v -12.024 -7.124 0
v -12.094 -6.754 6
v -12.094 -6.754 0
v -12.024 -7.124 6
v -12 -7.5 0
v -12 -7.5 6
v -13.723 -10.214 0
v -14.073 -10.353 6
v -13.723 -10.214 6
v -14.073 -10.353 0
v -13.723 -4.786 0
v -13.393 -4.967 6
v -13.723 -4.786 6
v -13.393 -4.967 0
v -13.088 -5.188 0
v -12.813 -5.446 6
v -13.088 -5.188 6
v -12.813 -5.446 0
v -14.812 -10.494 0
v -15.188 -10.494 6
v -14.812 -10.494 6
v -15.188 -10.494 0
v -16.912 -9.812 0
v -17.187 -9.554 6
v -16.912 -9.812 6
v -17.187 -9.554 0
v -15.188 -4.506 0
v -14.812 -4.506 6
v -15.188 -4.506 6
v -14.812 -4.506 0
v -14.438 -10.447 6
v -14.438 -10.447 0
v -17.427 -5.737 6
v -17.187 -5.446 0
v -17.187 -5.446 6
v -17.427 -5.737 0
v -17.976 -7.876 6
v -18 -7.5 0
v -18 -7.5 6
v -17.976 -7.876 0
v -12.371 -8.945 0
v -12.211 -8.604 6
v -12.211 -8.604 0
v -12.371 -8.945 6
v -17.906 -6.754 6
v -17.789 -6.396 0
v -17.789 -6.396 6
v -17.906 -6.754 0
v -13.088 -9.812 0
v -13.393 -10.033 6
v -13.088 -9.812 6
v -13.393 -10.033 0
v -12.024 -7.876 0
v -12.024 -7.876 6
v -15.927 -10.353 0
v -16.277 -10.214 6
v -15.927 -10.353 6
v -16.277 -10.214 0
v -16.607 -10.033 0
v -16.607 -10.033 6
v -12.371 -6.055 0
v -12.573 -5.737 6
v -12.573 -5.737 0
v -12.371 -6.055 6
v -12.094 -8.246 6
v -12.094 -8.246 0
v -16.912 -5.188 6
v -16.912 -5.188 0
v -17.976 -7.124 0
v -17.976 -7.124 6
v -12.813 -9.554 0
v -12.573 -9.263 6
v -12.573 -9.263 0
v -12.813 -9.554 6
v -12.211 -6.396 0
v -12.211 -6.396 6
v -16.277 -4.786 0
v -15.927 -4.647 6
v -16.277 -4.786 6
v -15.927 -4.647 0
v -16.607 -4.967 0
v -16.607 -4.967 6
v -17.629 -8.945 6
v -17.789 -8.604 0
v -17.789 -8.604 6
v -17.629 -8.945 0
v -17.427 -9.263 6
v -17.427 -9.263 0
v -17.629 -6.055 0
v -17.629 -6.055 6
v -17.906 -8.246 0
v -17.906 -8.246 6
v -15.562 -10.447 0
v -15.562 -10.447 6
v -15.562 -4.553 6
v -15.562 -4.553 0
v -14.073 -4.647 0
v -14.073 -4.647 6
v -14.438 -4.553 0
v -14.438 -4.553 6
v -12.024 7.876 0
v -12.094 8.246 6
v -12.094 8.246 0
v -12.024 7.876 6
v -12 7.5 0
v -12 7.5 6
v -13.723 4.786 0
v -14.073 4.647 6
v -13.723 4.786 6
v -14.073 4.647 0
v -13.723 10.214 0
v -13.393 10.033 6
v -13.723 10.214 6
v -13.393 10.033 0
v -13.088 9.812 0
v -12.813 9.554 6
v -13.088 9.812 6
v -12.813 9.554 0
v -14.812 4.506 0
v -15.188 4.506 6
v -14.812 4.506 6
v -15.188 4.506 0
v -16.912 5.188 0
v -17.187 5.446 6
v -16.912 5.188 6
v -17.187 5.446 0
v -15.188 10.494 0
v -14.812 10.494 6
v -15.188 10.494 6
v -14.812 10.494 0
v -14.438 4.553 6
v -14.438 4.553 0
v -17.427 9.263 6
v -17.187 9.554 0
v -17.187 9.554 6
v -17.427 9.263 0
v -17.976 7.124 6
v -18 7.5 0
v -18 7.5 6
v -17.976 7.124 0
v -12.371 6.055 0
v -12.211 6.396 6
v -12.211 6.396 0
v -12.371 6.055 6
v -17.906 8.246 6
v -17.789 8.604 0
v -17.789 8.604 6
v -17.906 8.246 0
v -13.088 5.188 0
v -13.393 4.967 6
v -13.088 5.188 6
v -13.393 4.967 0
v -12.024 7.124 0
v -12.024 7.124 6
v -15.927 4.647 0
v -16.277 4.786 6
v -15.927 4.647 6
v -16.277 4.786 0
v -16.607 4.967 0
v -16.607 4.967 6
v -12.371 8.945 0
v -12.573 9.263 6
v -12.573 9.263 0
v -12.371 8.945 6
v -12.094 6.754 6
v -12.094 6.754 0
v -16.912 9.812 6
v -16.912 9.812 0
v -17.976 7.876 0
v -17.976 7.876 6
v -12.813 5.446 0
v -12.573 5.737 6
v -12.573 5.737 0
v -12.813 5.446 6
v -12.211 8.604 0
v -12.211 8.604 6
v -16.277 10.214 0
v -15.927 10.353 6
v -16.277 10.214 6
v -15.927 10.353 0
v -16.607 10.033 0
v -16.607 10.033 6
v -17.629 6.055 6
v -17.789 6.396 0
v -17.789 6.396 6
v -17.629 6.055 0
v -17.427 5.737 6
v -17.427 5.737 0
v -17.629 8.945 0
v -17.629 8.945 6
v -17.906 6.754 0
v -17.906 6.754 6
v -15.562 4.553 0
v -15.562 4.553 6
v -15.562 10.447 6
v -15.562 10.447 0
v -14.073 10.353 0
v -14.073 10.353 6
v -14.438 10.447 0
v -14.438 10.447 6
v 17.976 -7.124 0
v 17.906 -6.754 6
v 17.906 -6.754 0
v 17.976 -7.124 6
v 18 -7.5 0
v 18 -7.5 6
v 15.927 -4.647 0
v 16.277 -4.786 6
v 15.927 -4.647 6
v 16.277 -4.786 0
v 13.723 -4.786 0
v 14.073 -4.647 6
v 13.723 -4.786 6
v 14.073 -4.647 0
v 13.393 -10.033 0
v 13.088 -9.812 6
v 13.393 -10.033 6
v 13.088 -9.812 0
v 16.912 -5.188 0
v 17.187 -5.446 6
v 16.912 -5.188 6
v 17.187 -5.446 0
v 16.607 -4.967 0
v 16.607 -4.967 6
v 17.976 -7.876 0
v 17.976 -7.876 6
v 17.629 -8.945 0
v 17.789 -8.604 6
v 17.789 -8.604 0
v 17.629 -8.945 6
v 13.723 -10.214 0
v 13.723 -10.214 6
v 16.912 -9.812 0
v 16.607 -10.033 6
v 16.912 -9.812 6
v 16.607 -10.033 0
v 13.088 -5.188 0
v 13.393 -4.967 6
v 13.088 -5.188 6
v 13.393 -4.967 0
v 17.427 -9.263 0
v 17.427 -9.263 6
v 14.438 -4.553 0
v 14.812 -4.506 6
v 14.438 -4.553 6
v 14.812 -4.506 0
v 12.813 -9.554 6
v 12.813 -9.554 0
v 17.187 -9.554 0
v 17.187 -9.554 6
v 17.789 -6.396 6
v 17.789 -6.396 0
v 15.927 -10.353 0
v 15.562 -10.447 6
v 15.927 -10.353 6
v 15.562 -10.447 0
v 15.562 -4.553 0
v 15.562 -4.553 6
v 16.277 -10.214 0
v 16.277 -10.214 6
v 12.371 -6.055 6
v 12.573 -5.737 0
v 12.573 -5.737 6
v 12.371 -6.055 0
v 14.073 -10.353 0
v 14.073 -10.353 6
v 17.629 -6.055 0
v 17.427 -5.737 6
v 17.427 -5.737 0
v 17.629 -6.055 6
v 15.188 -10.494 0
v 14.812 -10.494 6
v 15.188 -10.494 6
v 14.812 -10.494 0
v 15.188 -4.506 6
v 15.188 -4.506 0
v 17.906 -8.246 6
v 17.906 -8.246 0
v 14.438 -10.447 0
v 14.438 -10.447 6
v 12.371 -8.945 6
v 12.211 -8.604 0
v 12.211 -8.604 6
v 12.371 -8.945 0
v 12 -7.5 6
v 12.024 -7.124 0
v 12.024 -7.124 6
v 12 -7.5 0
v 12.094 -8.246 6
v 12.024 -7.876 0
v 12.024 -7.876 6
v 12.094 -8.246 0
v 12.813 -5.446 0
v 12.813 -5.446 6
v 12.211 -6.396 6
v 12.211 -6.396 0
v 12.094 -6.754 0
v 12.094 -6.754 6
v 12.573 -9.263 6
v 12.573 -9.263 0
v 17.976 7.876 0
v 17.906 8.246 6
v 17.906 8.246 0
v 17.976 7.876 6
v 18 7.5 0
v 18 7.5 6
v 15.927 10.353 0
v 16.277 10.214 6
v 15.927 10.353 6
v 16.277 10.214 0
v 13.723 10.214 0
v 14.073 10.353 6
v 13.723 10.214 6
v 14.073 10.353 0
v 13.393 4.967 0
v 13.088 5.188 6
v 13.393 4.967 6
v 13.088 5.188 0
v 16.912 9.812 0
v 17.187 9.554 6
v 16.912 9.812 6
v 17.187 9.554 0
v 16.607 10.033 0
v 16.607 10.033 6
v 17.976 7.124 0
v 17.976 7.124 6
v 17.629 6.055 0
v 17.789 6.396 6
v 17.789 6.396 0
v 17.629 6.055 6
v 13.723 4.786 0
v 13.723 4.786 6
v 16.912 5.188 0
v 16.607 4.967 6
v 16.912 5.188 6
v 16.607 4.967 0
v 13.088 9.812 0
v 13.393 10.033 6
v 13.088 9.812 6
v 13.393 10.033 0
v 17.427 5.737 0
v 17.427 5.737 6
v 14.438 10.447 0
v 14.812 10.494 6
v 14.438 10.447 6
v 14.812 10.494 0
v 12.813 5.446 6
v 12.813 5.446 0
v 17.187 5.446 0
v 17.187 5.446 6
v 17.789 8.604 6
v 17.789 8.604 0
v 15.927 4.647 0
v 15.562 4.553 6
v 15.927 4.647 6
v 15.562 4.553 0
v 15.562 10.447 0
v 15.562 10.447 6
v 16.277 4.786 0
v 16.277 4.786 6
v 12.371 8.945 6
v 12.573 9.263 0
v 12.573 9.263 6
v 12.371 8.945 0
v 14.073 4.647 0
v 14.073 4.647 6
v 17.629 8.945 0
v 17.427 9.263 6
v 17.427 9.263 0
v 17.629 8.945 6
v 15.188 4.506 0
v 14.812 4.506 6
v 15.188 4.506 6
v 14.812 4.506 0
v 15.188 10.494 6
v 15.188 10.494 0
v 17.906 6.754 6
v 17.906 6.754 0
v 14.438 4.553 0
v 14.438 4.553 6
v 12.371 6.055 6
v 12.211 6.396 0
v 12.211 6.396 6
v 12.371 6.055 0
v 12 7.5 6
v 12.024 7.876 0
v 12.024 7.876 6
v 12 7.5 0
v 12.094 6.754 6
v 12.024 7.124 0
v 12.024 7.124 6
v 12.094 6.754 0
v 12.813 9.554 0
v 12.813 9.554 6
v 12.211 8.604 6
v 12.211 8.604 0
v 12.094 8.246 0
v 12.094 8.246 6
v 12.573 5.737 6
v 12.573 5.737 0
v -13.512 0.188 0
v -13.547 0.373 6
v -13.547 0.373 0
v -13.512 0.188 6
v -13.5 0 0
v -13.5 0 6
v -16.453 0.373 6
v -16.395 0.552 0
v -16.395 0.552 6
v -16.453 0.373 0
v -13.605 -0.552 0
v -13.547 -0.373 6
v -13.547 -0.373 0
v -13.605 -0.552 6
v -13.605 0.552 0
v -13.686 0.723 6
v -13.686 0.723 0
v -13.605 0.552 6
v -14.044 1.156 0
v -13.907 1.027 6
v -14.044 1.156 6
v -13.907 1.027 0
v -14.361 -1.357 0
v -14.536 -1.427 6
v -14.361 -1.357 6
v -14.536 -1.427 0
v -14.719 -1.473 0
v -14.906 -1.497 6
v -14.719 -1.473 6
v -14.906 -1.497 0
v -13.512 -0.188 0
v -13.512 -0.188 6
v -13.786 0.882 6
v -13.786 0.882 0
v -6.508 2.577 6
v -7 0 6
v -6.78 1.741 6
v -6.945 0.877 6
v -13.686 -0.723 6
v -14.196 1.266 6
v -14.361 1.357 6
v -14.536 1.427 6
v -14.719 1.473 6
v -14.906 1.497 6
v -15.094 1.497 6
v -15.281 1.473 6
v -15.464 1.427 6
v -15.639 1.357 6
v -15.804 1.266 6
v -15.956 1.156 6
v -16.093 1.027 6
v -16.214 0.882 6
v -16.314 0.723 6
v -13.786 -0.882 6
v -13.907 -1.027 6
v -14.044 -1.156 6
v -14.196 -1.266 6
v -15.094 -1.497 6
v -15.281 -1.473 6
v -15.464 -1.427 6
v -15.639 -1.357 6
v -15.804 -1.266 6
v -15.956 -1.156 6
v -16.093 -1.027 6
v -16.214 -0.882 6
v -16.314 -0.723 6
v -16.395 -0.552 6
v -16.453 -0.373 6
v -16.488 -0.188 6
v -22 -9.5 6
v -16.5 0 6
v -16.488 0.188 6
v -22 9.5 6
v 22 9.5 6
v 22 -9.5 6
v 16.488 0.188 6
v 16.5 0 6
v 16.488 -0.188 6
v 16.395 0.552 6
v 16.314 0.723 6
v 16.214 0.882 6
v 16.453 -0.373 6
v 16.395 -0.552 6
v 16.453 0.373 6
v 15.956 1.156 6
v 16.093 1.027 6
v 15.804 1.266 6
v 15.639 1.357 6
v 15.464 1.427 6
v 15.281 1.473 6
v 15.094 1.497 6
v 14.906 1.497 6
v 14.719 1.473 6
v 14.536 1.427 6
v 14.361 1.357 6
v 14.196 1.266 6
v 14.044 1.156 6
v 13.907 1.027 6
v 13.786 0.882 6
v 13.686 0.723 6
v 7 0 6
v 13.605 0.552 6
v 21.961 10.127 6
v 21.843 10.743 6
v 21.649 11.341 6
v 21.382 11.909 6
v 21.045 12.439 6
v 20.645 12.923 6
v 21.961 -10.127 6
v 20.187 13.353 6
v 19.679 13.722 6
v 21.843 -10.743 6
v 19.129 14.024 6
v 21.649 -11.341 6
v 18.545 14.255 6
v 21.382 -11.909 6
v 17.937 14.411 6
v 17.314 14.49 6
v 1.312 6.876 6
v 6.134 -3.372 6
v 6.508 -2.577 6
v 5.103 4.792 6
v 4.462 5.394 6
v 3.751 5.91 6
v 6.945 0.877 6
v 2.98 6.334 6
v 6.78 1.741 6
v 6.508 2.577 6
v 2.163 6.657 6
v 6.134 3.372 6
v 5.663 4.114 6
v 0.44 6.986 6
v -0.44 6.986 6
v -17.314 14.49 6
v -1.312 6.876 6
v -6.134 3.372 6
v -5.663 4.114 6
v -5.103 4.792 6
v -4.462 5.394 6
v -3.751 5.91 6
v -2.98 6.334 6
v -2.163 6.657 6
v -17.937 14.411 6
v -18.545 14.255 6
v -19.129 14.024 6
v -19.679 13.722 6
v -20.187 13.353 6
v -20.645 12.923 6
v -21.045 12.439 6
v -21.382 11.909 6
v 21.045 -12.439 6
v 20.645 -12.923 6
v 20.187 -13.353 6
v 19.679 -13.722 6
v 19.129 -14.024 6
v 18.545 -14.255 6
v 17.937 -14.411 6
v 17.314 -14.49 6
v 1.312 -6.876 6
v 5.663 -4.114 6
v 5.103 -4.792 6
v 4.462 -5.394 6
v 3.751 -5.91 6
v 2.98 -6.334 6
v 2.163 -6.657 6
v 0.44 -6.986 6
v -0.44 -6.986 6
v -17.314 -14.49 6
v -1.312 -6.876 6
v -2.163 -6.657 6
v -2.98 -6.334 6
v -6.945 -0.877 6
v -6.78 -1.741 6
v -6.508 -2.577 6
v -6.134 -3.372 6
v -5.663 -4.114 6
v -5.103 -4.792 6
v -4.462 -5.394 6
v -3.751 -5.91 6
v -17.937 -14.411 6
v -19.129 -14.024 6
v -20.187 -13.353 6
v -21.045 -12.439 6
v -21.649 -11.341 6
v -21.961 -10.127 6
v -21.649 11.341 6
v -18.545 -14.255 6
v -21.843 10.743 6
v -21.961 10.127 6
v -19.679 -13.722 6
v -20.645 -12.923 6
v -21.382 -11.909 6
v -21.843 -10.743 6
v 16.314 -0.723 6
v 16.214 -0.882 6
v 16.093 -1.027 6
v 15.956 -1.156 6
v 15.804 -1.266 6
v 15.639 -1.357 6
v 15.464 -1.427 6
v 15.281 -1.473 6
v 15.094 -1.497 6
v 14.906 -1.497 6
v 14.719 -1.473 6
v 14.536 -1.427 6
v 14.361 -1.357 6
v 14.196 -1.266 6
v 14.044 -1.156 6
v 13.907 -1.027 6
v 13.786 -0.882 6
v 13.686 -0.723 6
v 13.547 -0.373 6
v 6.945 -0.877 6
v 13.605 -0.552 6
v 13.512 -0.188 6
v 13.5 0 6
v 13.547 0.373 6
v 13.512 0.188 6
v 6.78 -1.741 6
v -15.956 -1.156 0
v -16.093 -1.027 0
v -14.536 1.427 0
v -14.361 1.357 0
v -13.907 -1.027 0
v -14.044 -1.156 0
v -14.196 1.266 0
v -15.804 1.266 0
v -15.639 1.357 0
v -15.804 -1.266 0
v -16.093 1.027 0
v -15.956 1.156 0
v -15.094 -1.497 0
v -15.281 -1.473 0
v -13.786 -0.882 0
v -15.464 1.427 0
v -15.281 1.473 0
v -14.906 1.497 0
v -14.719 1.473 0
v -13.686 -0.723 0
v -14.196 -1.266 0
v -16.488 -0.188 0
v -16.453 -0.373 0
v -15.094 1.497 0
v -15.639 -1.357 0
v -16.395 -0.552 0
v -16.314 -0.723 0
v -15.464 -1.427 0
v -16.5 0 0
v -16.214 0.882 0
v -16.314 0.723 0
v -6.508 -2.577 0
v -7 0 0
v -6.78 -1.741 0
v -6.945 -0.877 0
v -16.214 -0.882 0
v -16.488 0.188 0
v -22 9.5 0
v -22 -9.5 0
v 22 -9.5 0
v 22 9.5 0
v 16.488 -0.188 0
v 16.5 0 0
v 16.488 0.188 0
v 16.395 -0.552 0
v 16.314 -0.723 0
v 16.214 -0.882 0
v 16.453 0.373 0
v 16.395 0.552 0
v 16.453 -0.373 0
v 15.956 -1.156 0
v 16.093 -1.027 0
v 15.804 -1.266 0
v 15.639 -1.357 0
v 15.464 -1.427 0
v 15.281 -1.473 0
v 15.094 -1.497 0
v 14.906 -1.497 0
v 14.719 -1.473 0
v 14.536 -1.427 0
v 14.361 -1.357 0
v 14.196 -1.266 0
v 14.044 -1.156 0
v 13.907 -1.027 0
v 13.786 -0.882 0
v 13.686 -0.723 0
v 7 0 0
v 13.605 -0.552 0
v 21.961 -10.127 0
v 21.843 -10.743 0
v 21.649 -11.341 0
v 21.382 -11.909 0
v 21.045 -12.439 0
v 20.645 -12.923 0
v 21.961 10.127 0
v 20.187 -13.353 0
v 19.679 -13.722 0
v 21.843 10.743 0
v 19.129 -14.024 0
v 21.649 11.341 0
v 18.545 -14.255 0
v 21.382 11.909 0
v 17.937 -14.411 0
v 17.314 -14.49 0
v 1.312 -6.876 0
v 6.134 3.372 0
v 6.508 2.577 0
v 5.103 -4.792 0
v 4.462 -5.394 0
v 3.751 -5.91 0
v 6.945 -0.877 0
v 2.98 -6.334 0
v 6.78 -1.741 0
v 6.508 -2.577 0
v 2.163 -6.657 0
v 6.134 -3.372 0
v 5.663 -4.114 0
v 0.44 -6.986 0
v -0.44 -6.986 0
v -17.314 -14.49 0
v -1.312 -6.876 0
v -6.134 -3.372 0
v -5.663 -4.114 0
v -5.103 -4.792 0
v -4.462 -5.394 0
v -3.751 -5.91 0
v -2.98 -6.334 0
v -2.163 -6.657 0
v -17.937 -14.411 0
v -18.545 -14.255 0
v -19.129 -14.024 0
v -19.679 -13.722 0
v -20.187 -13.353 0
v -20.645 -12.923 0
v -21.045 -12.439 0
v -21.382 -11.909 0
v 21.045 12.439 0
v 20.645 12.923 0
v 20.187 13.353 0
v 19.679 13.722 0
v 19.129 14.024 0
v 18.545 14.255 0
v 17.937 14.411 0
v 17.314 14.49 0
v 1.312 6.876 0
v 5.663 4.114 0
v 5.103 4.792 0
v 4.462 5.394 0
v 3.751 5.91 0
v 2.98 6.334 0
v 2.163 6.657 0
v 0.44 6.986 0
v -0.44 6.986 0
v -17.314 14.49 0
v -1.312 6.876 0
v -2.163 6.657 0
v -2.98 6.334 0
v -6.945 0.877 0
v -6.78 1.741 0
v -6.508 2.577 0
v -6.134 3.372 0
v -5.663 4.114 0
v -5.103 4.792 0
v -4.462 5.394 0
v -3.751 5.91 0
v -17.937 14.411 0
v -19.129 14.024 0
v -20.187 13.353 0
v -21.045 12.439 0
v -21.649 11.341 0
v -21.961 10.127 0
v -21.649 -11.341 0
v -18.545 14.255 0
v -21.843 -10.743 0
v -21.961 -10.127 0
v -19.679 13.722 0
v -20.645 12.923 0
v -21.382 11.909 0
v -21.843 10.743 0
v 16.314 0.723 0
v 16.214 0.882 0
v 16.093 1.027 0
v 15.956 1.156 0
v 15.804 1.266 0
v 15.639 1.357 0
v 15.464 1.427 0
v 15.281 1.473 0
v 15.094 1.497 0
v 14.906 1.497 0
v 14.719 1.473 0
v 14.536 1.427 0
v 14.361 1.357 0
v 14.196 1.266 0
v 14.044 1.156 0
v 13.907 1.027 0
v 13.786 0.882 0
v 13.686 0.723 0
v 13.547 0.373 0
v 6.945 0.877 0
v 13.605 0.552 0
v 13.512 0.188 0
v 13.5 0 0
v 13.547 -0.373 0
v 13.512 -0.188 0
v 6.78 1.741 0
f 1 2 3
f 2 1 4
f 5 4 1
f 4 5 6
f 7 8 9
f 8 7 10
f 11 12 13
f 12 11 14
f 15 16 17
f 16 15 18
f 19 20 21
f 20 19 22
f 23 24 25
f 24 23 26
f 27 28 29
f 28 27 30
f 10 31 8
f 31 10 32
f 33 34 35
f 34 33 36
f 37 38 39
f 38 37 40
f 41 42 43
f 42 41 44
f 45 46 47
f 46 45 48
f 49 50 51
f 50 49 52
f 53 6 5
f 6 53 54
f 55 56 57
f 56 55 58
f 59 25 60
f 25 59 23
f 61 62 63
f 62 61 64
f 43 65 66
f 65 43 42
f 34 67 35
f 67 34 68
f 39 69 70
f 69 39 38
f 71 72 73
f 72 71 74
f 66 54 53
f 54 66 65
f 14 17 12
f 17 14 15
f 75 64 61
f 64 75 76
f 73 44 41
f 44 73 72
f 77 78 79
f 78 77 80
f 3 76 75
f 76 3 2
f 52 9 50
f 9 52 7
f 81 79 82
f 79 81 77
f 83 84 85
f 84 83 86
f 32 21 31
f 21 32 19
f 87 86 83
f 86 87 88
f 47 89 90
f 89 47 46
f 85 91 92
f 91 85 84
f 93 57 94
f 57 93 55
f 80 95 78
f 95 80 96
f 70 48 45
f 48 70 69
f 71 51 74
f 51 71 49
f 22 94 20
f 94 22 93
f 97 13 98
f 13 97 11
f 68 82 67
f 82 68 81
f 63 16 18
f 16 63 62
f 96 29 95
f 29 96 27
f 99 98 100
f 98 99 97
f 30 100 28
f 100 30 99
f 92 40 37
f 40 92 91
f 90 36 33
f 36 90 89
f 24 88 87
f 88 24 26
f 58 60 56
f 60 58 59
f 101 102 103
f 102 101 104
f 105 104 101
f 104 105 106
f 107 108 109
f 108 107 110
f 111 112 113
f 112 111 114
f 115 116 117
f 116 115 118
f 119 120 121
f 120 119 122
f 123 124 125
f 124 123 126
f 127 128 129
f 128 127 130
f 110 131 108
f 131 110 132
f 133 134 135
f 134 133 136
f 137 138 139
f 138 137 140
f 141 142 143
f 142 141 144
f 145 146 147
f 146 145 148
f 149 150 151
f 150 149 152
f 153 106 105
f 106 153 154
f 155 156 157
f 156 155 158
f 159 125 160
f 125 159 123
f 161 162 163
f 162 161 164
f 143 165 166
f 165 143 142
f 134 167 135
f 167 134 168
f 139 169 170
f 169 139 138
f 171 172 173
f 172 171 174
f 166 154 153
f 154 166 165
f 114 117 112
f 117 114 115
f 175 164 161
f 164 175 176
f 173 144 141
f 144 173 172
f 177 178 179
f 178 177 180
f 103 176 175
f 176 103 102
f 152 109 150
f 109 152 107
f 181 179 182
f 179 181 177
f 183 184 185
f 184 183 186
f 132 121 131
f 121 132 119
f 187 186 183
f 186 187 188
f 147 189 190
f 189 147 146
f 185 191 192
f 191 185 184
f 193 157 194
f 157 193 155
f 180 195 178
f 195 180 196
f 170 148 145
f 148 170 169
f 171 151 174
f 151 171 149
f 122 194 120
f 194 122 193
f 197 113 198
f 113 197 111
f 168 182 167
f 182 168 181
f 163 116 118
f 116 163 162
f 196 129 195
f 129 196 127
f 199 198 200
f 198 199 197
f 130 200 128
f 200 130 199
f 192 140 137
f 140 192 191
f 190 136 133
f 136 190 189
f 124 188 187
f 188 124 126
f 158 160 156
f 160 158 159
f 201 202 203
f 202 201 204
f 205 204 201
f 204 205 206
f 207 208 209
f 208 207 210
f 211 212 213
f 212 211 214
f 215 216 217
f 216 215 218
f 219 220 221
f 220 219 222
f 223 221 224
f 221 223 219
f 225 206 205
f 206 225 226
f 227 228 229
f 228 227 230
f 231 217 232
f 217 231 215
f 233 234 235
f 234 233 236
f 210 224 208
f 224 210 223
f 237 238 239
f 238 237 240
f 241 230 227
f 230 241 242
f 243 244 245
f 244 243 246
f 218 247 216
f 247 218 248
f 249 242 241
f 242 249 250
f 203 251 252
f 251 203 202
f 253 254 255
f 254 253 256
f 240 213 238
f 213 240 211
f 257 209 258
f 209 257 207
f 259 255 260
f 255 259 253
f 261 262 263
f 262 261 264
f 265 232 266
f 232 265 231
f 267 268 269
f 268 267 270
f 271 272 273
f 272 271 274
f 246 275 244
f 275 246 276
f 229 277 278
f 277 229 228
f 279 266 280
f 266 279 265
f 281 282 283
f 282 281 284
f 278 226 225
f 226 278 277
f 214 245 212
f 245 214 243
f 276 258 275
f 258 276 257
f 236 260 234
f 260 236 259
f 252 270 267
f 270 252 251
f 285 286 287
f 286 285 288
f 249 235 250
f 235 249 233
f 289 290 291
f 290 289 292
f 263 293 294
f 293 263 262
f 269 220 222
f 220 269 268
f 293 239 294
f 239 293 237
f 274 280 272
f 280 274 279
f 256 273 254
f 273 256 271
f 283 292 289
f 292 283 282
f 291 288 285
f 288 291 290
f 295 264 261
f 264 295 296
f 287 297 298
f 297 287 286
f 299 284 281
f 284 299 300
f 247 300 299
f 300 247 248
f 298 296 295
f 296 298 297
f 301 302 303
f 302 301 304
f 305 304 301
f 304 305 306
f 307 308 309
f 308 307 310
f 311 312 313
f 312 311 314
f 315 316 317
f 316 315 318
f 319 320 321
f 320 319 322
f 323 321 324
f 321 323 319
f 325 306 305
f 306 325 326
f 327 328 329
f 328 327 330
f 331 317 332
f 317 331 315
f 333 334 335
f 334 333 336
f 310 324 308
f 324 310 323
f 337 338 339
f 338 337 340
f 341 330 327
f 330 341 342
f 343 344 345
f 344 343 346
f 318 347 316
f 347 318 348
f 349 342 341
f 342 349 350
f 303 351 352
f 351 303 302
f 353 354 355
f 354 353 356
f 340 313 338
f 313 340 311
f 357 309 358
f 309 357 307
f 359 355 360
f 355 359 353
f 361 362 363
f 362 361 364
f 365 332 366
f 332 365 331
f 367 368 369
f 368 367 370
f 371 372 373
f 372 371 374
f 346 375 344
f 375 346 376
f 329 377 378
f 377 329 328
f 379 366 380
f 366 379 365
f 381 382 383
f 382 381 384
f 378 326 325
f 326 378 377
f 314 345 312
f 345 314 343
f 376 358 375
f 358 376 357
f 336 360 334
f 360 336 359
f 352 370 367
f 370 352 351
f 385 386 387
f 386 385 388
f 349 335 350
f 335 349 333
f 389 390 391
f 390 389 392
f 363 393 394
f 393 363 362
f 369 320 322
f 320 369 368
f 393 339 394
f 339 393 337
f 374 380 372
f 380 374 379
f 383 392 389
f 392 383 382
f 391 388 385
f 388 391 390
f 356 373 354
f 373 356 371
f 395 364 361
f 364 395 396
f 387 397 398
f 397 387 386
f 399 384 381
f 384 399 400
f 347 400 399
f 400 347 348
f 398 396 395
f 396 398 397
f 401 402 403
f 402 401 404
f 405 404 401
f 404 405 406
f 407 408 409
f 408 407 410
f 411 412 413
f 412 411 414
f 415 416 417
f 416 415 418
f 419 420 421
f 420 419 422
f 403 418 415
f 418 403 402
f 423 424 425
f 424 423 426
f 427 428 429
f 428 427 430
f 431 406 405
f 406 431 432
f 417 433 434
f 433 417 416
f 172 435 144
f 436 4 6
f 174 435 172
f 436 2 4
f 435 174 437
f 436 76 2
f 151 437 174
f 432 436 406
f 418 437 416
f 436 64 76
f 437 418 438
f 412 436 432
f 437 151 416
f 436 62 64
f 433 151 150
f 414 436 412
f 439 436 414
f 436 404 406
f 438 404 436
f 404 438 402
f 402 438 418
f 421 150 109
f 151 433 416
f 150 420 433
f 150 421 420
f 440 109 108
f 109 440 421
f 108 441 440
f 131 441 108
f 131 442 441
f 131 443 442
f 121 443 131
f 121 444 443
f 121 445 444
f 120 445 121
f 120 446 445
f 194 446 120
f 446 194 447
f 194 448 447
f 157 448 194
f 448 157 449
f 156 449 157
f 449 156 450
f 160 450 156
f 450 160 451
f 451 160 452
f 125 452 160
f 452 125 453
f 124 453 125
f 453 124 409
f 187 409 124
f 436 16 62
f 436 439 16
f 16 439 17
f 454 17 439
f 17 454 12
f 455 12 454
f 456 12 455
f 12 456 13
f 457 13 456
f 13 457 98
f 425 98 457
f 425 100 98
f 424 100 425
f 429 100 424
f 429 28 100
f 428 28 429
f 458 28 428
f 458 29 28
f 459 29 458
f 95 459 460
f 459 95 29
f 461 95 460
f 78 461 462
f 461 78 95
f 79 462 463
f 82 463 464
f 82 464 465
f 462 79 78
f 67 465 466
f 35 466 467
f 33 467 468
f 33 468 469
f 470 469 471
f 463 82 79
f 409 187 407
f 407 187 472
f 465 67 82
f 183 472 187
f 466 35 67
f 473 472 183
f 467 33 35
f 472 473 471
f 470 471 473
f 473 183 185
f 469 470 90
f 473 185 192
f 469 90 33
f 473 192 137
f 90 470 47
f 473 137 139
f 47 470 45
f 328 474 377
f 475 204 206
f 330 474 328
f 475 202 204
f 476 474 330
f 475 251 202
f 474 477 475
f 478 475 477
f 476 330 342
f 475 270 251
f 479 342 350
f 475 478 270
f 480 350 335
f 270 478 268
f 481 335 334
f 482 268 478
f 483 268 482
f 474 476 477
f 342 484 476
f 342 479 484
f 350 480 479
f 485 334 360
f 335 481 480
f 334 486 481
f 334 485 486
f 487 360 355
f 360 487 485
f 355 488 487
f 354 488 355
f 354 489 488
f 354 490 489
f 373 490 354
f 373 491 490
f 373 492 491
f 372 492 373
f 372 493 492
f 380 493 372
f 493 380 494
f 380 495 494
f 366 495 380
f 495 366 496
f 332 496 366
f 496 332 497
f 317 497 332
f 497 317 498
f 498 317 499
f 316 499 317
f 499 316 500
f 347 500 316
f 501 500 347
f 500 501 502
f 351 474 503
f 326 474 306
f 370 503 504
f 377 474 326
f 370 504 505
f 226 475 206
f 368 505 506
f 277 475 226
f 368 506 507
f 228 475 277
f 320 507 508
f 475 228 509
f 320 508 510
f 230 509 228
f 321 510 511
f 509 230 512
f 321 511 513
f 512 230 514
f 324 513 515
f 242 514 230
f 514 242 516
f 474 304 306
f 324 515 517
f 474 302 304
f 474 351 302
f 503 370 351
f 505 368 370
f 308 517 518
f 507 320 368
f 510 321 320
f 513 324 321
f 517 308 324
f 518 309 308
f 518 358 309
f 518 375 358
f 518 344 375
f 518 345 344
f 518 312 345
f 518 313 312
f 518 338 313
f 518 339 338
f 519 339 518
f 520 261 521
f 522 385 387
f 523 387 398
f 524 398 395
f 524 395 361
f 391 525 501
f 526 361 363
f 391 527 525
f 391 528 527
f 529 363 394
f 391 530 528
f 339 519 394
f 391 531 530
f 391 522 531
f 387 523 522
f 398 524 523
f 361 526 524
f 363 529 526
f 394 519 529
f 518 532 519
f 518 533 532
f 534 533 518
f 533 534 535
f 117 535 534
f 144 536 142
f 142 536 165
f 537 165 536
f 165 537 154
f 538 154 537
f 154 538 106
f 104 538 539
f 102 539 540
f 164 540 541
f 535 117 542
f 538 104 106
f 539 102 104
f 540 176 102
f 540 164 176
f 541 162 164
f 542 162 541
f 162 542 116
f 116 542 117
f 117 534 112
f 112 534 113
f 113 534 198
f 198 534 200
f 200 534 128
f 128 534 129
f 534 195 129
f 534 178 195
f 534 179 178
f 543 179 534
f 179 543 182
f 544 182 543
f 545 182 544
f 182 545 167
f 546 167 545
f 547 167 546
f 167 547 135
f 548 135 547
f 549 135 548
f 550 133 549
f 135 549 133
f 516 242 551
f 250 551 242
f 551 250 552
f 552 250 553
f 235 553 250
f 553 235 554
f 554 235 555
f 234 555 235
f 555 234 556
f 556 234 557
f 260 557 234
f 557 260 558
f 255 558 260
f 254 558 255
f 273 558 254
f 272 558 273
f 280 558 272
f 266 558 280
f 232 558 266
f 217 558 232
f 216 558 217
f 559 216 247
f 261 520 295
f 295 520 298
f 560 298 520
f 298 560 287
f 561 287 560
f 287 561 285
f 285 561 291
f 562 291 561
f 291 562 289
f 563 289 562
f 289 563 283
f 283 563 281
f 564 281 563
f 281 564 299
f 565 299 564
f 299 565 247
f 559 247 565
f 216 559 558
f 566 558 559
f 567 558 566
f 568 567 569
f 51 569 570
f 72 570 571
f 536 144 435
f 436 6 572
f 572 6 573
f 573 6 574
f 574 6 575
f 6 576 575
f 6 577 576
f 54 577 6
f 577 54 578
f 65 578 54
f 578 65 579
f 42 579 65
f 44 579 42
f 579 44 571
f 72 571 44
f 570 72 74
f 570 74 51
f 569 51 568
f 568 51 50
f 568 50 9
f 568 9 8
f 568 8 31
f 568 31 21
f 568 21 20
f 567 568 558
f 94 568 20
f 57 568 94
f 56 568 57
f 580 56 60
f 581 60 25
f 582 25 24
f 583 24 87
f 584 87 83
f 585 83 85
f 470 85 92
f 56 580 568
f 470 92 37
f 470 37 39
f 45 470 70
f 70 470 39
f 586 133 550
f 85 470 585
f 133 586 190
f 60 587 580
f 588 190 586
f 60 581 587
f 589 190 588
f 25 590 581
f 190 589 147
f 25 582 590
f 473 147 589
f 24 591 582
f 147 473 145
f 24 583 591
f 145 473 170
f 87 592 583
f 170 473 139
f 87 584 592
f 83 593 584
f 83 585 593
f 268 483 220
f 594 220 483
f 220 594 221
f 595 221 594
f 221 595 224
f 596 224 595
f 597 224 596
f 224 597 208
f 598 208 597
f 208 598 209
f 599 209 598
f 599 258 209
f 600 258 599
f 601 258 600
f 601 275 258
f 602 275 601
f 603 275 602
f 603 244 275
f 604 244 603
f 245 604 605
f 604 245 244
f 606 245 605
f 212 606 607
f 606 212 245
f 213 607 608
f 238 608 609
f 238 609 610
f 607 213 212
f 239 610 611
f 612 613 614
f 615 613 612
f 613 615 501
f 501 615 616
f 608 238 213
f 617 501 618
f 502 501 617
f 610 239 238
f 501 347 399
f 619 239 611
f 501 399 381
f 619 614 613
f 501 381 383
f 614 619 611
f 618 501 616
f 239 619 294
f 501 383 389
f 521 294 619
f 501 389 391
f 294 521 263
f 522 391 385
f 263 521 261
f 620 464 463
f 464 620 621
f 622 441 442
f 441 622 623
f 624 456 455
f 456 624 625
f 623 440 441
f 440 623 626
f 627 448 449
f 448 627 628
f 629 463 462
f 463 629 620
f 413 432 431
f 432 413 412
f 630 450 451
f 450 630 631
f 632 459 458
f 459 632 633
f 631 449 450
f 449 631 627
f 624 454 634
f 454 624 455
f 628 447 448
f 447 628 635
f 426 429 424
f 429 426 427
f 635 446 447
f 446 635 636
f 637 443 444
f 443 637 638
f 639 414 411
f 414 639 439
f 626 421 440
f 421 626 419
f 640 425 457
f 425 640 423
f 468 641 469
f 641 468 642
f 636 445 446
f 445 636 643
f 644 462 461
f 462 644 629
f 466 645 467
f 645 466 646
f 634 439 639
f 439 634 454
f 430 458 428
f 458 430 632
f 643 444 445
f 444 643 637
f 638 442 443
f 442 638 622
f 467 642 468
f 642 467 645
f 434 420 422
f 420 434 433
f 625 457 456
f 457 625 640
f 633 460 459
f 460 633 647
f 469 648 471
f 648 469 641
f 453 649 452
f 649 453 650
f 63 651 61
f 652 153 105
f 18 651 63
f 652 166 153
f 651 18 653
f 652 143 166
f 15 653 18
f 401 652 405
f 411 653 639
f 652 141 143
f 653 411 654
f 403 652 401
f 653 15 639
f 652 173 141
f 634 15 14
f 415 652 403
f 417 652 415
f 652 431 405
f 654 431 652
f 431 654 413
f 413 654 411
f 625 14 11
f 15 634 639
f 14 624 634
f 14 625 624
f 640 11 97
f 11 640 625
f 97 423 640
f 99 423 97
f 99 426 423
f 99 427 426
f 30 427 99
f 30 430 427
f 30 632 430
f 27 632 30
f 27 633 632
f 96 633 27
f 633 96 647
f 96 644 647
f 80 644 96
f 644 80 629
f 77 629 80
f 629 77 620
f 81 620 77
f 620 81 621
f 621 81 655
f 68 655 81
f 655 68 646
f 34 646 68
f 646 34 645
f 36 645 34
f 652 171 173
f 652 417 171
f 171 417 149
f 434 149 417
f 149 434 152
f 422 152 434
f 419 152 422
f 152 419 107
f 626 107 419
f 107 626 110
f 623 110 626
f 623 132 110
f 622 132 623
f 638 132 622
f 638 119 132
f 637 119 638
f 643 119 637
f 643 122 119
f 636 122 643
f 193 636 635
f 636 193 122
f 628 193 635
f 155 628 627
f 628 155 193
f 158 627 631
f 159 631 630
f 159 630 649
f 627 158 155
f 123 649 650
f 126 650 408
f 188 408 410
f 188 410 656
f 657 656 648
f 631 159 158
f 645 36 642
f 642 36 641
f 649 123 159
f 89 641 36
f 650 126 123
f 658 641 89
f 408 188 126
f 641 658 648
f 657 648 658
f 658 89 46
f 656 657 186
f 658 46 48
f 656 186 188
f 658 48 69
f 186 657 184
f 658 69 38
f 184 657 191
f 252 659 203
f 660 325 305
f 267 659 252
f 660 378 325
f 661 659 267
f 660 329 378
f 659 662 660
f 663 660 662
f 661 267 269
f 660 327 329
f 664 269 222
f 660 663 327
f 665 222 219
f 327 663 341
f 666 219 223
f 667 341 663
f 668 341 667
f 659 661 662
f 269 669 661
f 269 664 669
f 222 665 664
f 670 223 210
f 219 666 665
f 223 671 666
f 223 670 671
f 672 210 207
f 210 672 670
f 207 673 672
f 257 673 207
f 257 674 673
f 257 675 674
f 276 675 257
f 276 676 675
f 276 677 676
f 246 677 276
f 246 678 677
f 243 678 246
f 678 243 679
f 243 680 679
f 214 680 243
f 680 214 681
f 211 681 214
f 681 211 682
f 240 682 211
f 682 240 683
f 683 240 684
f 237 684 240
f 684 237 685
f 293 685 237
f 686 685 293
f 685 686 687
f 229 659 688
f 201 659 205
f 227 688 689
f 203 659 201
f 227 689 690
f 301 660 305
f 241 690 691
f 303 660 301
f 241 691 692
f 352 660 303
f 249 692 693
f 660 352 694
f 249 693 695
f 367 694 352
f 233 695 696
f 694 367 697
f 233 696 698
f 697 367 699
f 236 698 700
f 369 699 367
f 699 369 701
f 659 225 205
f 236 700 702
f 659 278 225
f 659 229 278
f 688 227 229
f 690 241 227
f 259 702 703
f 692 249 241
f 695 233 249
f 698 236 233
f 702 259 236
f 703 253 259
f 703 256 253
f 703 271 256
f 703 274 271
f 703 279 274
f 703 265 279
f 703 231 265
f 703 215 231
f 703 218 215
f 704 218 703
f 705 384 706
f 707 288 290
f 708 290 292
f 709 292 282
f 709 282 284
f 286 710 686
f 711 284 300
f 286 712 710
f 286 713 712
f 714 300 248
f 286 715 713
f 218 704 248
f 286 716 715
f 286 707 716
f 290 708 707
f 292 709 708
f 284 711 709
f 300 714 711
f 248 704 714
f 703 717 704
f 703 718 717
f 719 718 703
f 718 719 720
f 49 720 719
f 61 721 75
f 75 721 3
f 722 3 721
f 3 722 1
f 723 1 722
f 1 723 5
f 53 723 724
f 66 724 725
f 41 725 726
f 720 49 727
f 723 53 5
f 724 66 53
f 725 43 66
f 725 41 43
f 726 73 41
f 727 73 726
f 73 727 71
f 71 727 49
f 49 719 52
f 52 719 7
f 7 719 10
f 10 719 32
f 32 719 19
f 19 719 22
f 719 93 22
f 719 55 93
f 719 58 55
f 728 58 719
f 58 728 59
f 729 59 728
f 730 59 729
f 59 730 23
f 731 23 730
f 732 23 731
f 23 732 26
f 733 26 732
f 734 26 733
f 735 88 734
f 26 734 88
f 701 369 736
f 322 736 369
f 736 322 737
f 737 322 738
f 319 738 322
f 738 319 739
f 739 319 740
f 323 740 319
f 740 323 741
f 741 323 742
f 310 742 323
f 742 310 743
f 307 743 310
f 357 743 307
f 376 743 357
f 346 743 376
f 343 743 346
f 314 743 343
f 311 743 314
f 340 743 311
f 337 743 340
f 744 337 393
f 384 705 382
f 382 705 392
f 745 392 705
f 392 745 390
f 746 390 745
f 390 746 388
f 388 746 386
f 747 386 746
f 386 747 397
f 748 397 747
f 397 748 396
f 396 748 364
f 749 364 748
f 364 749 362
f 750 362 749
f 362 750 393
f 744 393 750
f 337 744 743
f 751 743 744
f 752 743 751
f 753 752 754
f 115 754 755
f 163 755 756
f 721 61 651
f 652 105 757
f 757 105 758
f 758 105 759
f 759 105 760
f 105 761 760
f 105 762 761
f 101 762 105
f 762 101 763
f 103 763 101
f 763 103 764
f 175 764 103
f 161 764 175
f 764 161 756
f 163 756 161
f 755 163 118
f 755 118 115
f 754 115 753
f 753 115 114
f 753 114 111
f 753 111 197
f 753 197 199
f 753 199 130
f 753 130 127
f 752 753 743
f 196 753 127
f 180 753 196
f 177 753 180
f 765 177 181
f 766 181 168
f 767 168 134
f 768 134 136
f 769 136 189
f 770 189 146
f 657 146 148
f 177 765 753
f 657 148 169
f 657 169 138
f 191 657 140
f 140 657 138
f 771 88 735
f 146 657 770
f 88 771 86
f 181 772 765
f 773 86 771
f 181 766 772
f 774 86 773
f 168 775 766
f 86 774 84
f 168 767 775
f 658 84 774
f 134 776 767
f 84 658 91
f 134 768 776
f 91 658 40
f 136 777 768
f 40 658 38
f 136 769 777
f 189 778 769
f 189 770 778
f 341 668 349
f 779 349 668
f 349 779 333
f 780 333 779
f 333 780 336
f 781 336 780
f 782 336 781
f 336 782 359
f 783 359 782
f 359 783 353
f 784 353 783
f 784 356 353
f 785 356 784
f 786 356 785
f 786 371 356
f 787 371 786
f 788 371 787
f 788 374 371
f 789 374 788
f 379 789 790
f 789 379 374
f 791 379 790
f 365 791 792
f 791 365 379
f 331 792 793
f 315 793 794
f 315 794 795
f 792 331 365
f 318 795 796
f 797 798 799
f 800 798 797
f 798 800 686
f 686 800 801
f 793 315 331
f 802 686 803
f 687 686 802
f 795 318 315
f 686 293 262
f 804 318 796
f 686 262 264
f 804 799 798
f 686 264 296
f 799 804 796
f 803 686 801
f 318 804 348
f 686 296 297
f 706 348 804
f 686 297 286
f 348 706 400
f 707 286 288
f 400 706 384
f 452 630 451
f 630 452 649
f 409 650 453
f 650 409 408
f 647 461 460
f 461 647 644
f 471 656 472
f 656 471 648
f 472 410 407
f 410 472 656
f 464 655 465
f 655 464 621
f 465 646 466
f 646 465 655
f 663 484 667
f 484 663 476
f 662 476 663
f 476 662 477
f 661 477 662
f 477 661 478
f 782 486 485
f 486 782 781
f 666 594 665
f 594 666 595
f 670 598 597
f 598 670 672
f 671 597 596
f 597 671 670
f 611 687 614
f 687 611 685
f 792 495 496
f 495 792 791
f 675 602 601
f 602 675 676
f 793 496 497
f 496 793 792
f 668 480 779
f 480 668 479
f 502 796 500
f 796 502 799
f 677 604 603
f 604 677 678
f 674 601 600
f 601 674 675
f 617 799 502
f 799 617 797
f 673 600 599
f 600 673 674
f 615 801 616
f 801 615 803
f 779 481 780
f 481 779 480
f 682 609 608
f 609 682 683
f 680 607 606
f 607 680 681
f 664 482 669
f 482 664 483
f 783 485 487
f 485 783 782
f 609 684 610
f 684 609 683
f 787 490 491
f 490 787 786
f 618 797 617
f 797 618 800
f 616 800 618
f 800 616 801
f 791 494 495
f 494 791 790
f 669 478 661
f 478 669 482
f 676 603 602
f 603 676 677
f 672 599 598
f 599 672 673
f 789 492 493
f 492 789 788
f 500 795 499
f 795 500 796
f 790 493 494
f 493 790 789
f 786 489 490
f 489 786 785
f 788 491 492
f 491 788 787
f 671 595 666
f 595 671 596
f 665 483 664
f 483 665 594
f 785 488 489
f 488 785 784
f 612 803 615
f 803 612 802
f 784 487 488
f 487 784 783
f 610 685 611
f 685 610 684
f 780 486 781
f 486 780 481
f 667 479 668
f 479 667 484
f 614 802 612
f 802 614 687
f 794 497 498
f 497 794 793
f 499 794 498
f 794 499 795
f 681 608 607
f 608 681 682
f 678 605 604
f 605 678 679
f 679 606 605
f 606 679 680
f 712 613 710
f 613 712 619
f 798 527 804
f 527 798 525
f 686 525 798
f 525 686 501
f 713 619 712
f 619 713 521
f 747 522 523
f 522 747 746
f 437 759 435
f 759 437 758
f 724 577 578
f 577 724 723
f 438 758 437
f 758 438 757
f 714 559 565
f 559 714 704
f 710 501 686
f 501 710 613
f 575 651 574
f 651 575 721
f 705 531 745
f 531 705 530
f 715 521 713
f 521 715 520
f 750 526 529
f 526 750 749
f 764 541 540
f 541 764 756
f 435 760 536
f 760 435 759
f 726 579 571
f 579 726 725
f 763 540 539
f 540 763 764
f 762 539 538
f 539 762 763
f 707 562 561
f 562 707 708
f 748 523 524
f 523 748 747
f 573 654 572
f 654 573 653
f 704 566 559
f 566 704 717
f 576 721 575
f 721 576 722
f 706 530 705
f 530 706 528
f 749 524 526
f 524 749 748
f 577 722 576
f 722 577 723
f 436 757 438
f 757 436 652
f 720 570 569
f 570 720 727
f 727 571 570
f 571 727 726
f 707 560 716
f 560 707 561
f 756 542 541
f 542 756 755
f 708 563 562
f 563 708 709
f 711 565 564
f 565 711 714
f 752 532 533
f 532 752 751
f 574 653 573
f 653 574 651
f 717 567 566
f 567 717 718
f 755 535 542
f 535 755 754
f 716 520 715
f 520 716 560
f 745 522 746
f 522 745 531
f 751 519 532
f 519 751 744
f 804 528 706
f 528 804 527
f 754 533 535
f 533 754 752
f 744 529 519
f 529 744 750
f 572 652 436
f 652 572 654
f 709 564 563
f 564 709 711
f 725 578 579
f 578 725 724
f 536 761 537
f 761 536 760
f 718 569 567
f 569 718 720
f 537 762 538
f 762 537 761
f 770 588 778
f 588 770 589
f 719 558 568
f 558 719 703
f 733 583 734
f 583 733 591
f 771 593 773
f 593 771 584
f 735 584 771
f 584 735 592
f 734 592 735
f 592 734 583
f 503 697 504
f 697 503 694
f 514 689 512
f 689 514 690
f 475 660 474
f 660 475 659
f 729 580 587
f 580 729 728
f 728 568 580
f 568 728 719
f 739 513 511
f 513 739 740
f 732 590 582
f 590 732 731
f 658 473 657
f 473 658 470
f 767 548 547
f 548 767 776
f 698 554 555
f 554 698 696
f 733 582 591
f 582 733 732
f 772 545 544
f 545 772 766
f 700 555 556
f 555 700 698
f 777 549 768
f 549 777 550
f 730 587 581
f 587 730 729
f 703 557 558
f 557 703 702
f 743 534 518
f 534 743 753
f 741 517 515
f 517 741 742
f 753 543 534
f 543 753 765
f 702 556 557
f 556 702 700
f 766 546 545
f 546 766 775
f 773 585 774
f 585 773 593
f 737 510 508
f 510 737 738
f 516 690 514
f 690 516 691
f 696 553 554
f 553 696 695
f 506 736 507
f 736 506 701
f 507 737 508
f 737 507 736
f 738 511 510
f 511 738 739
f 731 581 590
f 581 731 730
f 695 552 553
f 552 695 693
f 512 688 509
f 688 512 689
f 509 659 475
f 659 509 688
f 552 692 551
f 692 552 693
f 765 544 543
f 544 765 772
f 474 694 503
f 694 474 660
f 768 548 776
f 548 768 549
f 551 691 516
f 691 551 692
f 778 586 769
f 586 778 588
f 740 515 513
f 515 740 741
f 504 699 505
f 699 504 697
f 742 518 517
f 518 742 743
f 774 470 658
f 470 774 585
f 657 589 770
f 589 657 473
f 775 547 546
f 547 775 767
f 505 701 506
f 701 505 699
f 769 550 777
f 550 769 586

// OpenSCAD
$fn = 50;


difference() {
	union() {
		hull() {
			translate(v = [-17.0000000000, 9.5000000000, 0]) {
				cylinder(h = 6, r = 5);
			}
			translate(v = [17.0000000000, 9.5000000000, 0]) {
				cylinder(h = 6, r = 5);
			}
			translate(v = [-17.0000000000, -9.5000000000, 0]) {
				cylinder(h = 6, r = 5);
			}
			translate(v = [17.0000000000, -9.5000000000, 0]) {
				cylinder(h = 6, r = 5);
			}
		}
	}
	union() {
		#translate(v = [-15.0000000000, -7.5000000000, 0]) {
			cylinder(h = 6, r = 3.0000000000);
		}
		#translate(v = [-15.0000000000, 7.5000000000, 0]) {
			cylinder(h = 6, r = 3.0000000000);
		}
		#translate(v = [15.0000000000, -7.5000000000, 0]) {
			cylinder(h = 6, r = 3.0000000000);
		}
		#translate(v = [15.0000000000, 7.5000000000, 0]) {
			cylinder(h = 6, r = 3.0000000000);
		}
		#translate(v = [-15.0000000000, -7.5000000000, -100.0000000000]) {
			cylinder(h = 200, r = 3.0000000000);
		}
		#translate(v = [-15.0000000000, 7.5000000000, -100.0000000000]) {
			cylinder(h = 200, r = 3.0000000000);
		}
		#translate(v = [15.0000000000, -7.5000000000, -100.0000000000]) {
			cylinder(h = 200, r = 3.0000000000);
		}
		#translate(v = [15.0000000000, 7.5000000000, -100.0000000000]) {
			cylinder(h = 200, r = 3.0000000000);
		}
		#translate(v = [-15.0000000000, -7.5000000000, 0]) {
			cylinder(h = 6, r = 1.5000000000);
		}
		#translate(v = [-15.0000000000, 0.0000000000, 0]) {
			cylinder(h = 6, r = 1.5000000000);
		}
		#translate(v = [-15.0000000000, 7.5000000000, 0]) {
			cylinder(h = 6, r = 1.5000000000);
		}
		#translate(v = [15.0000000000, -7.5000000000, 0]) {
			cylinder(h = 6, r = 1.5000000000);
		}
		#translate(v = [15.0000000000, 0.0000000000, 0]) {
			cylinder(h = 6, r = 1.5000000000);
		}
		#translate(v = [15.0000000000, 7.5000000000, 0]) {
			cylinder(h = 6, r = 1.5000000000);
		}
		#translate(v = [-15.0000000000, -7.5000000000, 0]) {
			cylinder(h = 6, r = 1.5000000000);
		}
		#translate(v = [-15.0000000000, 0.0000000000, 0]) {
			cylinder(h = 6, r = 1.5000000000);
		}
		#translate(v = [-15.0000000000, 7.5000000000, 0]) {
			cylinder(h = 6, r = 1.5000000000);
		}
		#translate(v = [15.0000000000, -7.5000000000, 0]) {
			cylinder(h = 6, r = 1.5000000000);
		}
		#translate(v = [15.0000000000, 0.0000000000, 0]) {
			cylinder(h = 6, r = 1.5000000000);
		}
		#translate(v = [15.0000000000, 7.5000000000, 0]) {
			cylinder(h = 6, r = 1.5000000000);
		}
		#translate(v = [-15.0000000000, -7.5000000000, 0]) {
			cylinder(h = 6, r = 1.5000000000);
		}
		#translate(v = [-15.0000000000, 0.0000000000, 0]) {
			cylinder(h = 6, r = 1.5000000000);
		}
		#translate(v = [-15.0000000000, 7.5000000000, 0]) {
			cylinder(h = 6, r = 1.5000000000);
		}
		#translate(v = [15.0000000000, -7.5000000000, 0]) {
			cylinder(h = 6, r = 1.5000000000);
		}
		#translate(v = [15.0000000000, 0.0000000000, 0]) {
			cylinder(h = 6, r = 1.5000000000);
		}
		#translate(v = [15.0000000000, 7.5000000000, 0]) {
			cylinder(h = 6, r = 1.5000000000);
		}
		#cylinder(h = 6, r = 7.0000000000);
	}
}
